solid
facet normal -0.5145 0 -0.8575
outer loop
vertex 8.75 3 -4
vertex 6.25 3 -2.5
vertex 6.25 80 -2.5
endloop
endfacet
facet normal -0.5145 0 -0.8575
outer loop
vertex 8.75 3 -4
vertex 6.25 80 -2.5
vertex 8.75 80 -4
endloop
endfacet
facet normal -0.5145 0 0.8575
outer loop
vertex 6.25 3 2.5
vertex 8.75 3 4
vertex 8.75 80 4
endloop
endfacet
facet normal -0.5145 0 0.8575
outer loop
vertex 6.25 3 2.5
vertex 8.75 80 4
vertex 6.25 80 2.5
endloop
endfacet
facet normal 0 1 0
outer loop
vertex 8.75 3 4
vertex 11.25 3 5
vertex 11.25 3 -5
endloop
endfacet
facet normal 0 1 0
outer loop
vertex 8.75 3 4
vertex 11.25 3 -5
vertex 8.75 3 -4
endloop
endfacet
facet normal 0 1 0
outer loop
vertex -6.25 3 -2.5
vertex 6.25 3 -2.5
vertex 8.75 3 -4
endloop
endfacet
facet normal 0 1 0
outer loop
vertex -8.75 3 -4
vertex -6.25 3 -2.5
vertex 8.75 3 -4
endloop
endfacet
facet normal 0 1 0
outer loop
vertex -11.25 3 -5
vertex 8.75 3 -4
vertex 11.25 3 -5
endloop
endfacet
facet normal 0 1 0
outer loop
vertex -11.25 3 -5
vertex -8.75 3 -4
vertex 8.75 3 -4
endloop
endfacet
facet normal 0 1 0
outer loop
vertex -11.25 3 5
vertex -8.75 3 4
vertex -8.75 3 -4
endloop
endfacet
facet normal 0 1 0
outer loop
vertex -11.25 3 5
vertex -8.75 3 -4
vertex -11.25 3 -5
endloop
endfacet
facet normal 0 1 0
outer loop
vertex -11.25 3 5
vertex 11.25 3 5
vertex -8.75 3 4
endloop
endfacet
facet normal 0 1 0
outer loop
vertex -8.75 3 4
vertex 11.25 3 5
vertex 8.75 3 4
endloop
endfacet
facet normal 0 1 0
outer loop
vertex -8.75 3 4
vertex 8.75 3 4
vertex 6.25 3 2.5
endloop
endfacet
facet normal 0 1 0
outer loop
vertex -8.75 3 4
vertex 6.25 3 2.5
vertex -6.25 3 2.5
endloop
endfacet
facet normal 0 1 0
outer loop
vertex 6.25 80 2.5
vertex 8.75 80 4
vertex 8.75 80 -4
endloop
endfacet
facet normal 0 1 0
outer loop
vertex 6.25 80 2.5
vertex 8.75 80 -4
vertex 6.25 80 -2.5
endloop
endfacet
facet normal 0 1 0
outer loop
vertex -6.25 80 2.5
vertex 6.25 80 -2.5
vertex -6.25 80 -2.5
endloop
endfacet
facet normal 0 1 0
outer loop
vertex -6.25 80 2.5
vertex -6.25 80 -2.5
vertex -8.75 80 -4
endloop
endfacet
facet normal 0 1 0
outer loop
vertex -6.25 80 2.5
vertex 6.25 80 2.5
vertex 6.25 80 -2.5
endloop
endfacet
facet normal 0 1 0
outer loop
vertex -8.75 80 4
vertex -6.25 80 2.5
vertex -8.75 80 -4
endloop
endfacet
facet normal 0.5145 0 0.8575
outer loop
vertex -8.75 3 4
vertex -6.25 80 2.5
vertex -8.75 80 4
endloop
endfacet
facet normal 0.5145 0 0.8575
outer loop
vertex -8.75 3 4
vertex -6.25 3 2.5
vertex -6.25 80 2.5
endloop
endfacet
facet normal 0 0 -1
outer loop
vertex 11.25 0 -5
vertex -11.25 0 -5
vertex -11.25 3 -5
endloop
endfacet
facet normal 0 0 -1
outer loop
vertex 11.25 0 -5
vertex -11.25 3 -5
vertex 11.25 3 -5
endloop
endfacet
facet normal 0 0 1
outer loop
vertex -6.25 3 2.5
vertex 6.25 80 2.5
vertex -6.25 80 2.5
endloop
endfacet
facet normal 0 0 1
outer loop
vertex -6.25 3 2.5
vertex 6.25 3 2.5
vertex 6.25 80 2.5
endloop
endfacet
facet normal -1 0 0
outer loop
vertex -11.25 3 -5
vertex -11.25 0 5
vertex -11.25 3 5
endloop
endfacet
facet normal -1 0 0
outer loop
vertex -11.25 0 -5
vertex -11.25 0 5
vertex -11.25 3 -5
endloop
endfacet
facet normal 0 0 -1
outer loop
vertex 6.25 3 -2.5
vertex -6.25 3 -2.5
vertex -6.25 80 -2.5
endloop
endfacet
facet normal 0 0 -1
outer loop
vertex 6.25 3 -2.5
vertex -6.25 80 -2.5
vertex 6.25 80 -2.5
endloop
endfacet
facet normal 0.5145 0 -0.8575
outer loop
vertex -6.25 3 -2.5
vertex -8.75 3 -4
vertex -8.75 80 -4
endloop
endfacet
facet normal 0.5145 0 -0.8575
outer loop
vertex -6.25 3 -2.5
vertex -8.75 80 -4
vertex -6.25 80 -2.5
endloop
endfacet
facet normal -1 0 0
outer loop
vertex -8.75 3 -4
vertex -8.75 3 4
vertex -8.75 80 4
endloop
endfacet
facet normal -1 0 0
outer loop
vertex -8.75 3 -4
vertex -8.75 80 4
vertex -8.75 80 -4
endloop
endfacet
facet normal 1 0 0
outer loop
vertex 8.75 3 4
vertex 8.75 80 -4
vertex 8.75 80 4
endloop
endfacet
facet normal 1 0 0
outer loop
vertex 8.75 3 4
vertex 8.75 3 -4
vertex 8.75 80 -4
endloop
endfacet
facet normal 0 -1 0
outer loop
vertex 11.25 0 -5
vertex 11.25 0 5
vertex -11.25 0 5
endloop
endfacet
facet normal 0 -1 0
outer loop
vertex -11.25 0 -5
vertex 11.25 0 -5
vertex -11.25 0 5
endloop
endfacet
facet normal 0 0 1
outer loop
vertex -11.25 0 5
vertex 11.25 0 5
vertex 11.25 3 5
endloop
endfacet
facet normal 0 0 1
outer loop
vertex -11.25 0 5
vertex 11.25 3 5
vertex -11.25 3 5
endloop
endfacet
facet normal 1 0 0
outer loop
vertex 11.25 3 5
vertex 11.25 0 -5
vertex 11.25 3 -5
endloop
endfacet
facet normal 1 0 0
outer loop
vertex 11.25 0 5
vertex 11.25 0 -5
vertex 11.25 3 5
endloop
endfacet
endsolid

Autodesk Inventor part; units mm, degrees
ref_plane "YZ Plane" through (0, 0, 0) normal (1, 0, 0) x (0, 1, 0)
ref_plane "XZ Plane" through (0, 0, 0) normal (0, 1, 0) x (-1, 0, 0)
ref_plane "XY Plane" through (0, 0, 0) normal (0, 0, 1) x (1, 0, 0)
sketch "Sketch1" plane through (0, 0, 0) normal (0, 1, 0) x (-1, 0, 0)
  line L0 (0, -2.5) -> (-6.25, -2.5)
  line L1 (-6.25, -2.5) -> (-8.75, -4)
  line L2 (-8.75, -4) -> (-8.75, 4)
  line L3 (-8.75, 4) -> (-6.25, 2.5)
  line L4 (-6.25, 2.5) -> (0, 2.5)
  line L5 (0, 2.5) -> (0, -2.5)
  line L6 (0, -5) -> (-11.25, -5)
  line L7 (-11.25, -5) -> (-11.25, 5)
  line L8 (-11.25, 5) -> (0, 5)
  line L9 (0, 5) -> (0, -5)
  point P0 (-8.75, 0)
  point P1 (0, 0)
  point P2 (0, 0)
  point P3 (0, 2.5)
  dimension "d16" = 5
  dimension "d17" = 2.5
  dimension "d18" = 8
  dimension "d19" = 8.75
  dimension "d20" = 11.25
  dimension "d21" = 5
  dimension "d22" = 5
extrude "Extrusion1" add sketch "Sketch1" along normal blind 3
extrude "Extrusion2" add sketch "Sketch1" along normal blind 80 contours L0 L1 L2 L3 L4 L5
mirror "Mirror1" about plane through (0, 0, -5) normal (-1, 0, 0) of "Extrusion1", "Extrusion2"
properties part number "drawerconnector"
